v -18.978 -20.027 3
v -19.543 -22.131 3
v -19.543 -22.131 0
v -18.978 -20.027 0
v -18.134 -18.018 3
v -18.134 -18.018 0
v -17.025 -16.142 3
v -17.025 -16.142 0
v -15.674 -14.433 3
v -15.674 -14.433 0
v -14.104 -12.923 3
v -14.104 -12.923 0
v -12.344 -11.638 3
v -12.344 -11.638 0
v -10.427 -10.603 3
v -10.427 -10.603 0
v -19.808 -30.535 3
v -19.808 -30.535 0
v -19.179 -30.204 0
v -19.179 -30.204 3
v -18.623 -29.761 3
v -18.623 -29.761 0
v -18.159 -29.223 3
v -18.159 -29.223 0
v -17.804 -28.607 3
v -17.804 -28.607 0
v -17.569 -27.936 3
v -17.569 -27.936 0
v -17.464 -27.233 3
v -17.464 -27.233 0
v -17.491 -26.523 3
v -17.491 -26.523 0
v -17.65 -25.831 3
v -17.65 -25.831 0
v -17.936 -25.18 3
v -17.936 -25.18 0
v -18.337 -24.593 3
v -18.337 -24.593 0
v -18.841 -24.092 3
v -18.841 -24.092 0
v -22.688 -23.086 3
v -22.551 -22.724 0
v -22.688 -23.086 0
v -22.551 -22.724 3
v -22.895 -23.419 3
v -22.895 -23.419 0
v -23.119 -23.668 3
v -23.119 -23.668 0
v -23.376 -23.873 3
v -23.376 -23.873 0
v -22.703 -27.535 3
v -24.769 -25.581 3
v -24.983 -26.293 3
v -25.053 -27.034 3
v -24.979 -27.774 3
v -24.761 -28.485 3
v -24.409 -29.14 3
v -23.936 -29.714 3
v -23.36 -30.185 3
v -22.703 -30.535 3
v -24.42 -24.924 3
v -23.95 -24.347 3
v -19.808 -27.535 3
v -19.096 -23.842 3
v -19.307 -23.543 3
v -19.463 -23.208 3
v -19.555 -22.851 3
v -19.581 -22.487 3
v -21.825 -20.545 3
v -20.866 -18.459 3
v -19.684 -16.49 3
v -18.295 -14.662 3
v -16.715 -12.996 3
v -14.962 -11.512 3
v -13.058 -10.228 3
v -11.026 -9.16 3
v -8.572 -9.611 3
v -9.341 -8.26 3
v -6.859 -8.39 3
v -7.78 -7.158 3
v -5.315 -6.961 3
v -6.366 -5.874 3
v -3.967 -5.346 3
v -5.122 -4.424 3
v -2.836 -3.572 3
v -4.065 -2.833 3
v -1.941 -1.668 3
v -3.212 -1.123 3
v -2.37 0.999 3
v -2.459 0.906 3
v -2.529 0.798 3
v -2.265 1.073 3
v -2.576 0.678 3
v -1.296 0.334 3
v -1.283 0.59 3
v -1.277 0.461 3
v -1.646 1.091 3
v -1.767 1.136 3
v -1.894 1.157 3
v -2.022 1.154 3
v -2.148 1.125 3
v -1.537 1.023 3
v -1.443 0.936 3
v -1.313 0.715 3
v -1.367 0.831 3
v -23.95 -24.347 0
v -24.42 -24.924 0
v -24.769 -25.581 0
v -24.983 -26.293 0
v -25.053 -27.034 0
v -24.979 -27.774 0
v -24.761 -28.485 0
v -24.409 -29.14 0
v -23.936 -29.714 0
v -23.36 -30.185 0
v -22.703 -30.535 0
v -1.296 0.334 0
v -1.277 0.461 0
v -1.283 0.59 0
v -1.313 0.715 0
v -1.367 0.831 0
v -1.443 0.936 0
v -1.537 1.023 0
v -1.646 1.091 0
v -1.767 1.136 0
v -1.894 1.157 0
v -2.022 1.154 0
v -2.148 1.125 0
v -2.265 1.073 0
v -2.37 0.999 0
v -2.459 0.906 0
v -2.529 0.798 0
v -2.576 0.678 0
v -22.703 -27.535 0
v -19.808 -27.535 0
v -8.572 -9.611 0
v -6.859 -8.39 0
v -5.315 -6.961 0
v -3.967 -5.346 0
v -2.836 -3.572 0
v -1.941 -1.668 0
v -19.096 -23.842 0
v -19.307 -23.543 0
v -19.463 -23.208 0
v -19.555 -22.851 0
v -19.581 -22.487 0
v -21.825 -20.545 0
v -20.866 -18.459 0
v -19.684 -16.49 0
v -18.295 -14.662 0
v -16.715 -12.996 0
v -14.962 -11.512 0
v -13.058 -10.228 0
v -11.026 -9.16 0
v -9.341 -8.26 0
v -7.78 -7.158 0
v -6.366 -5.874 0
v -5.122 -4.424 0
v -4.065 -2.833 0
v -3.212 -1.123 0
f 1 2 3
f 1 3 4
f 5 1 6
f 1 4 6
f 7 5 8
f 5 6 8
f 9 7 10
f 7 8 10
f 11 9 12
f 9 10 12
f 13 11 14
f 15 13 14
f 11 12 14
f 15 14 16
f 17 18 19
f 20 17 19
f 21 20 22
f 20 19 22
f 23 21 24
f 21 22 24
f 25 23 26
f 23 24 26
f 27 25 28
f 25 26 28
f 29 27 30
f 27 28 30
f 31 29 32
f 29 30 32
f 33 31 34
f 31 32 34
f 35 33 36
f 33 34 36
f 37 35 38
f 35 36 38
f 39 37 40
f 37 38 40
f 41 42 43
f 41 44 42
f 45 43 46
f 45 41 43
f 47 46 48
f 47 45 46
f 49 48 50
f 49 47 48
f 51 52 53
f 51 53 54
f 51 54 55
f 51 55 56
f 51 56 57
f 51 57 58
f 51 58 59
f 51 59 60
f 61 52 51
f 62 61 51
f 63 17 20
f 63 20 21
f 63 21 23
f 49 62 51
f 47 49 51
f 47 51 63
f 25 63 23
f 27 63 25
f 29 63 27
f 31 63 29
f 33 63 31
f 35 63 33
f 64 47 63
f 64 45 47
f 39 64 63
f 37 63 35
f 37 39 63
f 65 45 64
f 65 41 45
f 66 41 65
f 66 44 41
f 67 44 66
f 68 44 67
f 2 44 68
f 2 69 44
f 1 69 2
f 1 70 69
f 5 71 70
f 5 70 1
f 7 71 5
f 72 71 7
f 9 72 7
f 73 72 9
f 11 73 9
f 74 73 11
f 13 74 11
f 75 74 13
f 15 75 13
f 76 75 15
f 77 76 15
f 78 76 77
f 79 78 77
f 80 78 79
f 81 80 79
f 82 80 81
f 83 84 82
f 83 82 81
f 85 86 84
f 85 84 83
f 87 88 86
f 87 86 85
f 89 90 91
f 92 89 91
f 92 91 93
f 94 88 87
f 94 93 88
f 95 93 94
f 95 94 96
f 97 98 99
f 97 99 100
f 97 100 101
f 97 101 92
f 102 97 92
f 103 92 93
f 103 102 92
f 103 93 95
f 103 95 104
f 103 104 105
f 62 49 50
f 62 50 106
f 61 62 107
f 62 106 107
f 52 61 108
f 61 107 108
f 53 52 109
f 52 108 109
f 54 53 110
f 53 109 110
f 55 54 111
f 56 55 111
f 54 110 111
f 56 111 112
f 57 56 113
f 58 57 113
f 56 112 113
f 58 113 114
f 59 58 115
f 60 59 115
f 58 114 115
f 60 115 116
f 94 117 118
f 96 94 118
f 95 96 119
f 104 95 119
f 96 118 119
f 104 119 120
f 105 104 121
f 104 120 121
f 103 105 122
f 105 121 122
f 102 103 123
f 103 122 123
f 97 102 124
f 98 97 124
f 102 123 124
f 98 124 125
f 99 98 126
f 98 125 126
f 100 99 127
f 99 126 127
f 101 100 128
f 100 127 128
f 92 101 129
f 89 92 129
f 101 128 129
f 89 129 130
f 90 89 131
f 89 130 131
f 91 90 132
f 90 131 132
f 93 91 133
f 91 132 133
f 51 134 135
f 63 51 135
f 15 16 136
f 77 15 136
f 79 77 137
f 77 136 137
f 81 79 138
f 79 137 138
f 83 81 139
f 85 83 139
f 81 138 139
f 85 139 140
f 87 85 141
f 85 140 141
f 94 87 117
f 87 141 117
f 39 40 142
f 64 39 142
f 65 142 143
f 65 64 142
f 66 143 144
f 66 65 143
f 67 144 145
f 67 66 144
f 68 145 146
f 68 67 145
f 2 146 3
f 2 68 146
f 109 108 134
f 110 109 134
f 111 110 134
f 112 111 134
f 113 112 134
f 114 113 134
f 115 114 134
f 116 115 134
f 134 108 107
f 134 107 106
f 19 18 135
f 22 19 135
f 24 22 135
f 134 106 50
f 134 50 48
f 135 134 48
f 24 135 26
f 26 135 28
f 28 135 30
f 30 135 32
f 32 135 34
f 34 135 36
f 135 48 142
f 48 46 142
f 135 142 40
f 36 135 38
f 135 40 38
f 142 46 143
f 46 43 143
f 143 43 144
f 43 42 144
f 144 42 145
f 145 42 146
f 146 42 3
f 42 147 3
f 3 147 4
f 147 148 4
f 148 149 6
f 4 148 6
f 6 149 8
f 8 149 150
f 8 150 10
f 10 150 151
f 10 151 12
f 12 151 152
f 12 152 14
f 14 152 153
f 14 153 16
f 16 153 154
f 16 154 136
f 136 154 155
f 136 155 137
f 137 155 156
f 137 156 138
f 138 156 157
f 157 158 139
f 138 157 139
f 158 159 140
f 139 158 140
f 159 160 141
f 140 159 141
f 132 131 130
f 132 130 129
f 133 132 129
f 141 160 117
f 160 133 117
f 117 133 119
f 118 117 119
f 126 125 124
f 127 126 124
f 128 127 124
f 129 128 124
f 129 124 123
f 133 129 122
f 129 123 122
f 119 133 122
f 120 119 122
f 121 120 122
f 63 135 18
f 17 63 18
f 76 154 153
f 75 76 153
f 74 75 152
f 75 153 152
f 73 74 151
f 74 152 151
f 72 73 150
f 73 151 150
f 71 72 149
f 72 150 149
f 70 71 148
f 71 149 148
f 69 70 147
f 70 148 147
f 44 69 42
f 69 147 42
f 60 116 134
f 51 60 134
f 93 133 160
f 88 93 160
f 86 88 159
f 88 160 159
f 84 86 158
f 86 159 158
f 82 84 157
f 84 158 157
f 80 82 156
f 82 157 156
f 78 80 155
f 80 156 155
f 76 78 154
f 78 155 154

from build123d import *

# Parameters (mm, degrees)
EXTRUDE_1_DEPTH = 3
FILLET_1_R      = 2.032


with BuildPart() as part:
    # 스케치1 → 보스-돌출1 (new body)
    with BuildSketch(Plane.XY):
        with BuildLine():
            Line((-22.703212056, -30.53470544), (-22.703212056, -27.53470544))
            Line((-22.703212056, -27.53470544), (-19.808212056, -27.53470544))
            Line((-19.808212056, -27.53470544), (-19.808212056, -30.53470544))
            ThreePointArc((-19.808212056, -30.53470544), (-17.458089238, -27.052134486), (-19.755712056, -23.53470544))
            ThreePointArc((-19.755712056, -23.53470544), (-16.806747664, -15.831278272), (-10.426669431, -10.603106234))
            ThreePointArc((-10.426669431, -10.603106234), (-4.615473218, -6.174719455), (-1.296316018, 0.334028993))
            ThreePointArc((-1.296316018, 0.334028993), (-1.766656874, 1.136185733), (-2.575803416, 0.677974178))
            ThreePointArc((-2.575803416, 0.677974178), (-5.721510813, -5.168139004), (-11.025821999, -9.160230838))
            ThreePointArc((-11.025821999, -9.160230838), (-18.562919164, -14.982954912), (-22.755712056, -23.53470544))
            ThreePointArc((-22.755712056, -23.53470544), (-25.053334873, -27.052134486), (-22.703212056, -30.53470544))
        make_face()
    extrude(amount=EXTRUDE_1_DEPTH)

    # 필렛1
    fillet_1_edges = [part.edges().sort_by_distance(p)[0] for p in [
        (-22.755712056, -23.53470544, 1.5),
        (-19.755712056, -23.53470544, 1.5),
    ]]
    fillet(fillet_1_edges, radius=FILLET_1_R)


solid = part.part
